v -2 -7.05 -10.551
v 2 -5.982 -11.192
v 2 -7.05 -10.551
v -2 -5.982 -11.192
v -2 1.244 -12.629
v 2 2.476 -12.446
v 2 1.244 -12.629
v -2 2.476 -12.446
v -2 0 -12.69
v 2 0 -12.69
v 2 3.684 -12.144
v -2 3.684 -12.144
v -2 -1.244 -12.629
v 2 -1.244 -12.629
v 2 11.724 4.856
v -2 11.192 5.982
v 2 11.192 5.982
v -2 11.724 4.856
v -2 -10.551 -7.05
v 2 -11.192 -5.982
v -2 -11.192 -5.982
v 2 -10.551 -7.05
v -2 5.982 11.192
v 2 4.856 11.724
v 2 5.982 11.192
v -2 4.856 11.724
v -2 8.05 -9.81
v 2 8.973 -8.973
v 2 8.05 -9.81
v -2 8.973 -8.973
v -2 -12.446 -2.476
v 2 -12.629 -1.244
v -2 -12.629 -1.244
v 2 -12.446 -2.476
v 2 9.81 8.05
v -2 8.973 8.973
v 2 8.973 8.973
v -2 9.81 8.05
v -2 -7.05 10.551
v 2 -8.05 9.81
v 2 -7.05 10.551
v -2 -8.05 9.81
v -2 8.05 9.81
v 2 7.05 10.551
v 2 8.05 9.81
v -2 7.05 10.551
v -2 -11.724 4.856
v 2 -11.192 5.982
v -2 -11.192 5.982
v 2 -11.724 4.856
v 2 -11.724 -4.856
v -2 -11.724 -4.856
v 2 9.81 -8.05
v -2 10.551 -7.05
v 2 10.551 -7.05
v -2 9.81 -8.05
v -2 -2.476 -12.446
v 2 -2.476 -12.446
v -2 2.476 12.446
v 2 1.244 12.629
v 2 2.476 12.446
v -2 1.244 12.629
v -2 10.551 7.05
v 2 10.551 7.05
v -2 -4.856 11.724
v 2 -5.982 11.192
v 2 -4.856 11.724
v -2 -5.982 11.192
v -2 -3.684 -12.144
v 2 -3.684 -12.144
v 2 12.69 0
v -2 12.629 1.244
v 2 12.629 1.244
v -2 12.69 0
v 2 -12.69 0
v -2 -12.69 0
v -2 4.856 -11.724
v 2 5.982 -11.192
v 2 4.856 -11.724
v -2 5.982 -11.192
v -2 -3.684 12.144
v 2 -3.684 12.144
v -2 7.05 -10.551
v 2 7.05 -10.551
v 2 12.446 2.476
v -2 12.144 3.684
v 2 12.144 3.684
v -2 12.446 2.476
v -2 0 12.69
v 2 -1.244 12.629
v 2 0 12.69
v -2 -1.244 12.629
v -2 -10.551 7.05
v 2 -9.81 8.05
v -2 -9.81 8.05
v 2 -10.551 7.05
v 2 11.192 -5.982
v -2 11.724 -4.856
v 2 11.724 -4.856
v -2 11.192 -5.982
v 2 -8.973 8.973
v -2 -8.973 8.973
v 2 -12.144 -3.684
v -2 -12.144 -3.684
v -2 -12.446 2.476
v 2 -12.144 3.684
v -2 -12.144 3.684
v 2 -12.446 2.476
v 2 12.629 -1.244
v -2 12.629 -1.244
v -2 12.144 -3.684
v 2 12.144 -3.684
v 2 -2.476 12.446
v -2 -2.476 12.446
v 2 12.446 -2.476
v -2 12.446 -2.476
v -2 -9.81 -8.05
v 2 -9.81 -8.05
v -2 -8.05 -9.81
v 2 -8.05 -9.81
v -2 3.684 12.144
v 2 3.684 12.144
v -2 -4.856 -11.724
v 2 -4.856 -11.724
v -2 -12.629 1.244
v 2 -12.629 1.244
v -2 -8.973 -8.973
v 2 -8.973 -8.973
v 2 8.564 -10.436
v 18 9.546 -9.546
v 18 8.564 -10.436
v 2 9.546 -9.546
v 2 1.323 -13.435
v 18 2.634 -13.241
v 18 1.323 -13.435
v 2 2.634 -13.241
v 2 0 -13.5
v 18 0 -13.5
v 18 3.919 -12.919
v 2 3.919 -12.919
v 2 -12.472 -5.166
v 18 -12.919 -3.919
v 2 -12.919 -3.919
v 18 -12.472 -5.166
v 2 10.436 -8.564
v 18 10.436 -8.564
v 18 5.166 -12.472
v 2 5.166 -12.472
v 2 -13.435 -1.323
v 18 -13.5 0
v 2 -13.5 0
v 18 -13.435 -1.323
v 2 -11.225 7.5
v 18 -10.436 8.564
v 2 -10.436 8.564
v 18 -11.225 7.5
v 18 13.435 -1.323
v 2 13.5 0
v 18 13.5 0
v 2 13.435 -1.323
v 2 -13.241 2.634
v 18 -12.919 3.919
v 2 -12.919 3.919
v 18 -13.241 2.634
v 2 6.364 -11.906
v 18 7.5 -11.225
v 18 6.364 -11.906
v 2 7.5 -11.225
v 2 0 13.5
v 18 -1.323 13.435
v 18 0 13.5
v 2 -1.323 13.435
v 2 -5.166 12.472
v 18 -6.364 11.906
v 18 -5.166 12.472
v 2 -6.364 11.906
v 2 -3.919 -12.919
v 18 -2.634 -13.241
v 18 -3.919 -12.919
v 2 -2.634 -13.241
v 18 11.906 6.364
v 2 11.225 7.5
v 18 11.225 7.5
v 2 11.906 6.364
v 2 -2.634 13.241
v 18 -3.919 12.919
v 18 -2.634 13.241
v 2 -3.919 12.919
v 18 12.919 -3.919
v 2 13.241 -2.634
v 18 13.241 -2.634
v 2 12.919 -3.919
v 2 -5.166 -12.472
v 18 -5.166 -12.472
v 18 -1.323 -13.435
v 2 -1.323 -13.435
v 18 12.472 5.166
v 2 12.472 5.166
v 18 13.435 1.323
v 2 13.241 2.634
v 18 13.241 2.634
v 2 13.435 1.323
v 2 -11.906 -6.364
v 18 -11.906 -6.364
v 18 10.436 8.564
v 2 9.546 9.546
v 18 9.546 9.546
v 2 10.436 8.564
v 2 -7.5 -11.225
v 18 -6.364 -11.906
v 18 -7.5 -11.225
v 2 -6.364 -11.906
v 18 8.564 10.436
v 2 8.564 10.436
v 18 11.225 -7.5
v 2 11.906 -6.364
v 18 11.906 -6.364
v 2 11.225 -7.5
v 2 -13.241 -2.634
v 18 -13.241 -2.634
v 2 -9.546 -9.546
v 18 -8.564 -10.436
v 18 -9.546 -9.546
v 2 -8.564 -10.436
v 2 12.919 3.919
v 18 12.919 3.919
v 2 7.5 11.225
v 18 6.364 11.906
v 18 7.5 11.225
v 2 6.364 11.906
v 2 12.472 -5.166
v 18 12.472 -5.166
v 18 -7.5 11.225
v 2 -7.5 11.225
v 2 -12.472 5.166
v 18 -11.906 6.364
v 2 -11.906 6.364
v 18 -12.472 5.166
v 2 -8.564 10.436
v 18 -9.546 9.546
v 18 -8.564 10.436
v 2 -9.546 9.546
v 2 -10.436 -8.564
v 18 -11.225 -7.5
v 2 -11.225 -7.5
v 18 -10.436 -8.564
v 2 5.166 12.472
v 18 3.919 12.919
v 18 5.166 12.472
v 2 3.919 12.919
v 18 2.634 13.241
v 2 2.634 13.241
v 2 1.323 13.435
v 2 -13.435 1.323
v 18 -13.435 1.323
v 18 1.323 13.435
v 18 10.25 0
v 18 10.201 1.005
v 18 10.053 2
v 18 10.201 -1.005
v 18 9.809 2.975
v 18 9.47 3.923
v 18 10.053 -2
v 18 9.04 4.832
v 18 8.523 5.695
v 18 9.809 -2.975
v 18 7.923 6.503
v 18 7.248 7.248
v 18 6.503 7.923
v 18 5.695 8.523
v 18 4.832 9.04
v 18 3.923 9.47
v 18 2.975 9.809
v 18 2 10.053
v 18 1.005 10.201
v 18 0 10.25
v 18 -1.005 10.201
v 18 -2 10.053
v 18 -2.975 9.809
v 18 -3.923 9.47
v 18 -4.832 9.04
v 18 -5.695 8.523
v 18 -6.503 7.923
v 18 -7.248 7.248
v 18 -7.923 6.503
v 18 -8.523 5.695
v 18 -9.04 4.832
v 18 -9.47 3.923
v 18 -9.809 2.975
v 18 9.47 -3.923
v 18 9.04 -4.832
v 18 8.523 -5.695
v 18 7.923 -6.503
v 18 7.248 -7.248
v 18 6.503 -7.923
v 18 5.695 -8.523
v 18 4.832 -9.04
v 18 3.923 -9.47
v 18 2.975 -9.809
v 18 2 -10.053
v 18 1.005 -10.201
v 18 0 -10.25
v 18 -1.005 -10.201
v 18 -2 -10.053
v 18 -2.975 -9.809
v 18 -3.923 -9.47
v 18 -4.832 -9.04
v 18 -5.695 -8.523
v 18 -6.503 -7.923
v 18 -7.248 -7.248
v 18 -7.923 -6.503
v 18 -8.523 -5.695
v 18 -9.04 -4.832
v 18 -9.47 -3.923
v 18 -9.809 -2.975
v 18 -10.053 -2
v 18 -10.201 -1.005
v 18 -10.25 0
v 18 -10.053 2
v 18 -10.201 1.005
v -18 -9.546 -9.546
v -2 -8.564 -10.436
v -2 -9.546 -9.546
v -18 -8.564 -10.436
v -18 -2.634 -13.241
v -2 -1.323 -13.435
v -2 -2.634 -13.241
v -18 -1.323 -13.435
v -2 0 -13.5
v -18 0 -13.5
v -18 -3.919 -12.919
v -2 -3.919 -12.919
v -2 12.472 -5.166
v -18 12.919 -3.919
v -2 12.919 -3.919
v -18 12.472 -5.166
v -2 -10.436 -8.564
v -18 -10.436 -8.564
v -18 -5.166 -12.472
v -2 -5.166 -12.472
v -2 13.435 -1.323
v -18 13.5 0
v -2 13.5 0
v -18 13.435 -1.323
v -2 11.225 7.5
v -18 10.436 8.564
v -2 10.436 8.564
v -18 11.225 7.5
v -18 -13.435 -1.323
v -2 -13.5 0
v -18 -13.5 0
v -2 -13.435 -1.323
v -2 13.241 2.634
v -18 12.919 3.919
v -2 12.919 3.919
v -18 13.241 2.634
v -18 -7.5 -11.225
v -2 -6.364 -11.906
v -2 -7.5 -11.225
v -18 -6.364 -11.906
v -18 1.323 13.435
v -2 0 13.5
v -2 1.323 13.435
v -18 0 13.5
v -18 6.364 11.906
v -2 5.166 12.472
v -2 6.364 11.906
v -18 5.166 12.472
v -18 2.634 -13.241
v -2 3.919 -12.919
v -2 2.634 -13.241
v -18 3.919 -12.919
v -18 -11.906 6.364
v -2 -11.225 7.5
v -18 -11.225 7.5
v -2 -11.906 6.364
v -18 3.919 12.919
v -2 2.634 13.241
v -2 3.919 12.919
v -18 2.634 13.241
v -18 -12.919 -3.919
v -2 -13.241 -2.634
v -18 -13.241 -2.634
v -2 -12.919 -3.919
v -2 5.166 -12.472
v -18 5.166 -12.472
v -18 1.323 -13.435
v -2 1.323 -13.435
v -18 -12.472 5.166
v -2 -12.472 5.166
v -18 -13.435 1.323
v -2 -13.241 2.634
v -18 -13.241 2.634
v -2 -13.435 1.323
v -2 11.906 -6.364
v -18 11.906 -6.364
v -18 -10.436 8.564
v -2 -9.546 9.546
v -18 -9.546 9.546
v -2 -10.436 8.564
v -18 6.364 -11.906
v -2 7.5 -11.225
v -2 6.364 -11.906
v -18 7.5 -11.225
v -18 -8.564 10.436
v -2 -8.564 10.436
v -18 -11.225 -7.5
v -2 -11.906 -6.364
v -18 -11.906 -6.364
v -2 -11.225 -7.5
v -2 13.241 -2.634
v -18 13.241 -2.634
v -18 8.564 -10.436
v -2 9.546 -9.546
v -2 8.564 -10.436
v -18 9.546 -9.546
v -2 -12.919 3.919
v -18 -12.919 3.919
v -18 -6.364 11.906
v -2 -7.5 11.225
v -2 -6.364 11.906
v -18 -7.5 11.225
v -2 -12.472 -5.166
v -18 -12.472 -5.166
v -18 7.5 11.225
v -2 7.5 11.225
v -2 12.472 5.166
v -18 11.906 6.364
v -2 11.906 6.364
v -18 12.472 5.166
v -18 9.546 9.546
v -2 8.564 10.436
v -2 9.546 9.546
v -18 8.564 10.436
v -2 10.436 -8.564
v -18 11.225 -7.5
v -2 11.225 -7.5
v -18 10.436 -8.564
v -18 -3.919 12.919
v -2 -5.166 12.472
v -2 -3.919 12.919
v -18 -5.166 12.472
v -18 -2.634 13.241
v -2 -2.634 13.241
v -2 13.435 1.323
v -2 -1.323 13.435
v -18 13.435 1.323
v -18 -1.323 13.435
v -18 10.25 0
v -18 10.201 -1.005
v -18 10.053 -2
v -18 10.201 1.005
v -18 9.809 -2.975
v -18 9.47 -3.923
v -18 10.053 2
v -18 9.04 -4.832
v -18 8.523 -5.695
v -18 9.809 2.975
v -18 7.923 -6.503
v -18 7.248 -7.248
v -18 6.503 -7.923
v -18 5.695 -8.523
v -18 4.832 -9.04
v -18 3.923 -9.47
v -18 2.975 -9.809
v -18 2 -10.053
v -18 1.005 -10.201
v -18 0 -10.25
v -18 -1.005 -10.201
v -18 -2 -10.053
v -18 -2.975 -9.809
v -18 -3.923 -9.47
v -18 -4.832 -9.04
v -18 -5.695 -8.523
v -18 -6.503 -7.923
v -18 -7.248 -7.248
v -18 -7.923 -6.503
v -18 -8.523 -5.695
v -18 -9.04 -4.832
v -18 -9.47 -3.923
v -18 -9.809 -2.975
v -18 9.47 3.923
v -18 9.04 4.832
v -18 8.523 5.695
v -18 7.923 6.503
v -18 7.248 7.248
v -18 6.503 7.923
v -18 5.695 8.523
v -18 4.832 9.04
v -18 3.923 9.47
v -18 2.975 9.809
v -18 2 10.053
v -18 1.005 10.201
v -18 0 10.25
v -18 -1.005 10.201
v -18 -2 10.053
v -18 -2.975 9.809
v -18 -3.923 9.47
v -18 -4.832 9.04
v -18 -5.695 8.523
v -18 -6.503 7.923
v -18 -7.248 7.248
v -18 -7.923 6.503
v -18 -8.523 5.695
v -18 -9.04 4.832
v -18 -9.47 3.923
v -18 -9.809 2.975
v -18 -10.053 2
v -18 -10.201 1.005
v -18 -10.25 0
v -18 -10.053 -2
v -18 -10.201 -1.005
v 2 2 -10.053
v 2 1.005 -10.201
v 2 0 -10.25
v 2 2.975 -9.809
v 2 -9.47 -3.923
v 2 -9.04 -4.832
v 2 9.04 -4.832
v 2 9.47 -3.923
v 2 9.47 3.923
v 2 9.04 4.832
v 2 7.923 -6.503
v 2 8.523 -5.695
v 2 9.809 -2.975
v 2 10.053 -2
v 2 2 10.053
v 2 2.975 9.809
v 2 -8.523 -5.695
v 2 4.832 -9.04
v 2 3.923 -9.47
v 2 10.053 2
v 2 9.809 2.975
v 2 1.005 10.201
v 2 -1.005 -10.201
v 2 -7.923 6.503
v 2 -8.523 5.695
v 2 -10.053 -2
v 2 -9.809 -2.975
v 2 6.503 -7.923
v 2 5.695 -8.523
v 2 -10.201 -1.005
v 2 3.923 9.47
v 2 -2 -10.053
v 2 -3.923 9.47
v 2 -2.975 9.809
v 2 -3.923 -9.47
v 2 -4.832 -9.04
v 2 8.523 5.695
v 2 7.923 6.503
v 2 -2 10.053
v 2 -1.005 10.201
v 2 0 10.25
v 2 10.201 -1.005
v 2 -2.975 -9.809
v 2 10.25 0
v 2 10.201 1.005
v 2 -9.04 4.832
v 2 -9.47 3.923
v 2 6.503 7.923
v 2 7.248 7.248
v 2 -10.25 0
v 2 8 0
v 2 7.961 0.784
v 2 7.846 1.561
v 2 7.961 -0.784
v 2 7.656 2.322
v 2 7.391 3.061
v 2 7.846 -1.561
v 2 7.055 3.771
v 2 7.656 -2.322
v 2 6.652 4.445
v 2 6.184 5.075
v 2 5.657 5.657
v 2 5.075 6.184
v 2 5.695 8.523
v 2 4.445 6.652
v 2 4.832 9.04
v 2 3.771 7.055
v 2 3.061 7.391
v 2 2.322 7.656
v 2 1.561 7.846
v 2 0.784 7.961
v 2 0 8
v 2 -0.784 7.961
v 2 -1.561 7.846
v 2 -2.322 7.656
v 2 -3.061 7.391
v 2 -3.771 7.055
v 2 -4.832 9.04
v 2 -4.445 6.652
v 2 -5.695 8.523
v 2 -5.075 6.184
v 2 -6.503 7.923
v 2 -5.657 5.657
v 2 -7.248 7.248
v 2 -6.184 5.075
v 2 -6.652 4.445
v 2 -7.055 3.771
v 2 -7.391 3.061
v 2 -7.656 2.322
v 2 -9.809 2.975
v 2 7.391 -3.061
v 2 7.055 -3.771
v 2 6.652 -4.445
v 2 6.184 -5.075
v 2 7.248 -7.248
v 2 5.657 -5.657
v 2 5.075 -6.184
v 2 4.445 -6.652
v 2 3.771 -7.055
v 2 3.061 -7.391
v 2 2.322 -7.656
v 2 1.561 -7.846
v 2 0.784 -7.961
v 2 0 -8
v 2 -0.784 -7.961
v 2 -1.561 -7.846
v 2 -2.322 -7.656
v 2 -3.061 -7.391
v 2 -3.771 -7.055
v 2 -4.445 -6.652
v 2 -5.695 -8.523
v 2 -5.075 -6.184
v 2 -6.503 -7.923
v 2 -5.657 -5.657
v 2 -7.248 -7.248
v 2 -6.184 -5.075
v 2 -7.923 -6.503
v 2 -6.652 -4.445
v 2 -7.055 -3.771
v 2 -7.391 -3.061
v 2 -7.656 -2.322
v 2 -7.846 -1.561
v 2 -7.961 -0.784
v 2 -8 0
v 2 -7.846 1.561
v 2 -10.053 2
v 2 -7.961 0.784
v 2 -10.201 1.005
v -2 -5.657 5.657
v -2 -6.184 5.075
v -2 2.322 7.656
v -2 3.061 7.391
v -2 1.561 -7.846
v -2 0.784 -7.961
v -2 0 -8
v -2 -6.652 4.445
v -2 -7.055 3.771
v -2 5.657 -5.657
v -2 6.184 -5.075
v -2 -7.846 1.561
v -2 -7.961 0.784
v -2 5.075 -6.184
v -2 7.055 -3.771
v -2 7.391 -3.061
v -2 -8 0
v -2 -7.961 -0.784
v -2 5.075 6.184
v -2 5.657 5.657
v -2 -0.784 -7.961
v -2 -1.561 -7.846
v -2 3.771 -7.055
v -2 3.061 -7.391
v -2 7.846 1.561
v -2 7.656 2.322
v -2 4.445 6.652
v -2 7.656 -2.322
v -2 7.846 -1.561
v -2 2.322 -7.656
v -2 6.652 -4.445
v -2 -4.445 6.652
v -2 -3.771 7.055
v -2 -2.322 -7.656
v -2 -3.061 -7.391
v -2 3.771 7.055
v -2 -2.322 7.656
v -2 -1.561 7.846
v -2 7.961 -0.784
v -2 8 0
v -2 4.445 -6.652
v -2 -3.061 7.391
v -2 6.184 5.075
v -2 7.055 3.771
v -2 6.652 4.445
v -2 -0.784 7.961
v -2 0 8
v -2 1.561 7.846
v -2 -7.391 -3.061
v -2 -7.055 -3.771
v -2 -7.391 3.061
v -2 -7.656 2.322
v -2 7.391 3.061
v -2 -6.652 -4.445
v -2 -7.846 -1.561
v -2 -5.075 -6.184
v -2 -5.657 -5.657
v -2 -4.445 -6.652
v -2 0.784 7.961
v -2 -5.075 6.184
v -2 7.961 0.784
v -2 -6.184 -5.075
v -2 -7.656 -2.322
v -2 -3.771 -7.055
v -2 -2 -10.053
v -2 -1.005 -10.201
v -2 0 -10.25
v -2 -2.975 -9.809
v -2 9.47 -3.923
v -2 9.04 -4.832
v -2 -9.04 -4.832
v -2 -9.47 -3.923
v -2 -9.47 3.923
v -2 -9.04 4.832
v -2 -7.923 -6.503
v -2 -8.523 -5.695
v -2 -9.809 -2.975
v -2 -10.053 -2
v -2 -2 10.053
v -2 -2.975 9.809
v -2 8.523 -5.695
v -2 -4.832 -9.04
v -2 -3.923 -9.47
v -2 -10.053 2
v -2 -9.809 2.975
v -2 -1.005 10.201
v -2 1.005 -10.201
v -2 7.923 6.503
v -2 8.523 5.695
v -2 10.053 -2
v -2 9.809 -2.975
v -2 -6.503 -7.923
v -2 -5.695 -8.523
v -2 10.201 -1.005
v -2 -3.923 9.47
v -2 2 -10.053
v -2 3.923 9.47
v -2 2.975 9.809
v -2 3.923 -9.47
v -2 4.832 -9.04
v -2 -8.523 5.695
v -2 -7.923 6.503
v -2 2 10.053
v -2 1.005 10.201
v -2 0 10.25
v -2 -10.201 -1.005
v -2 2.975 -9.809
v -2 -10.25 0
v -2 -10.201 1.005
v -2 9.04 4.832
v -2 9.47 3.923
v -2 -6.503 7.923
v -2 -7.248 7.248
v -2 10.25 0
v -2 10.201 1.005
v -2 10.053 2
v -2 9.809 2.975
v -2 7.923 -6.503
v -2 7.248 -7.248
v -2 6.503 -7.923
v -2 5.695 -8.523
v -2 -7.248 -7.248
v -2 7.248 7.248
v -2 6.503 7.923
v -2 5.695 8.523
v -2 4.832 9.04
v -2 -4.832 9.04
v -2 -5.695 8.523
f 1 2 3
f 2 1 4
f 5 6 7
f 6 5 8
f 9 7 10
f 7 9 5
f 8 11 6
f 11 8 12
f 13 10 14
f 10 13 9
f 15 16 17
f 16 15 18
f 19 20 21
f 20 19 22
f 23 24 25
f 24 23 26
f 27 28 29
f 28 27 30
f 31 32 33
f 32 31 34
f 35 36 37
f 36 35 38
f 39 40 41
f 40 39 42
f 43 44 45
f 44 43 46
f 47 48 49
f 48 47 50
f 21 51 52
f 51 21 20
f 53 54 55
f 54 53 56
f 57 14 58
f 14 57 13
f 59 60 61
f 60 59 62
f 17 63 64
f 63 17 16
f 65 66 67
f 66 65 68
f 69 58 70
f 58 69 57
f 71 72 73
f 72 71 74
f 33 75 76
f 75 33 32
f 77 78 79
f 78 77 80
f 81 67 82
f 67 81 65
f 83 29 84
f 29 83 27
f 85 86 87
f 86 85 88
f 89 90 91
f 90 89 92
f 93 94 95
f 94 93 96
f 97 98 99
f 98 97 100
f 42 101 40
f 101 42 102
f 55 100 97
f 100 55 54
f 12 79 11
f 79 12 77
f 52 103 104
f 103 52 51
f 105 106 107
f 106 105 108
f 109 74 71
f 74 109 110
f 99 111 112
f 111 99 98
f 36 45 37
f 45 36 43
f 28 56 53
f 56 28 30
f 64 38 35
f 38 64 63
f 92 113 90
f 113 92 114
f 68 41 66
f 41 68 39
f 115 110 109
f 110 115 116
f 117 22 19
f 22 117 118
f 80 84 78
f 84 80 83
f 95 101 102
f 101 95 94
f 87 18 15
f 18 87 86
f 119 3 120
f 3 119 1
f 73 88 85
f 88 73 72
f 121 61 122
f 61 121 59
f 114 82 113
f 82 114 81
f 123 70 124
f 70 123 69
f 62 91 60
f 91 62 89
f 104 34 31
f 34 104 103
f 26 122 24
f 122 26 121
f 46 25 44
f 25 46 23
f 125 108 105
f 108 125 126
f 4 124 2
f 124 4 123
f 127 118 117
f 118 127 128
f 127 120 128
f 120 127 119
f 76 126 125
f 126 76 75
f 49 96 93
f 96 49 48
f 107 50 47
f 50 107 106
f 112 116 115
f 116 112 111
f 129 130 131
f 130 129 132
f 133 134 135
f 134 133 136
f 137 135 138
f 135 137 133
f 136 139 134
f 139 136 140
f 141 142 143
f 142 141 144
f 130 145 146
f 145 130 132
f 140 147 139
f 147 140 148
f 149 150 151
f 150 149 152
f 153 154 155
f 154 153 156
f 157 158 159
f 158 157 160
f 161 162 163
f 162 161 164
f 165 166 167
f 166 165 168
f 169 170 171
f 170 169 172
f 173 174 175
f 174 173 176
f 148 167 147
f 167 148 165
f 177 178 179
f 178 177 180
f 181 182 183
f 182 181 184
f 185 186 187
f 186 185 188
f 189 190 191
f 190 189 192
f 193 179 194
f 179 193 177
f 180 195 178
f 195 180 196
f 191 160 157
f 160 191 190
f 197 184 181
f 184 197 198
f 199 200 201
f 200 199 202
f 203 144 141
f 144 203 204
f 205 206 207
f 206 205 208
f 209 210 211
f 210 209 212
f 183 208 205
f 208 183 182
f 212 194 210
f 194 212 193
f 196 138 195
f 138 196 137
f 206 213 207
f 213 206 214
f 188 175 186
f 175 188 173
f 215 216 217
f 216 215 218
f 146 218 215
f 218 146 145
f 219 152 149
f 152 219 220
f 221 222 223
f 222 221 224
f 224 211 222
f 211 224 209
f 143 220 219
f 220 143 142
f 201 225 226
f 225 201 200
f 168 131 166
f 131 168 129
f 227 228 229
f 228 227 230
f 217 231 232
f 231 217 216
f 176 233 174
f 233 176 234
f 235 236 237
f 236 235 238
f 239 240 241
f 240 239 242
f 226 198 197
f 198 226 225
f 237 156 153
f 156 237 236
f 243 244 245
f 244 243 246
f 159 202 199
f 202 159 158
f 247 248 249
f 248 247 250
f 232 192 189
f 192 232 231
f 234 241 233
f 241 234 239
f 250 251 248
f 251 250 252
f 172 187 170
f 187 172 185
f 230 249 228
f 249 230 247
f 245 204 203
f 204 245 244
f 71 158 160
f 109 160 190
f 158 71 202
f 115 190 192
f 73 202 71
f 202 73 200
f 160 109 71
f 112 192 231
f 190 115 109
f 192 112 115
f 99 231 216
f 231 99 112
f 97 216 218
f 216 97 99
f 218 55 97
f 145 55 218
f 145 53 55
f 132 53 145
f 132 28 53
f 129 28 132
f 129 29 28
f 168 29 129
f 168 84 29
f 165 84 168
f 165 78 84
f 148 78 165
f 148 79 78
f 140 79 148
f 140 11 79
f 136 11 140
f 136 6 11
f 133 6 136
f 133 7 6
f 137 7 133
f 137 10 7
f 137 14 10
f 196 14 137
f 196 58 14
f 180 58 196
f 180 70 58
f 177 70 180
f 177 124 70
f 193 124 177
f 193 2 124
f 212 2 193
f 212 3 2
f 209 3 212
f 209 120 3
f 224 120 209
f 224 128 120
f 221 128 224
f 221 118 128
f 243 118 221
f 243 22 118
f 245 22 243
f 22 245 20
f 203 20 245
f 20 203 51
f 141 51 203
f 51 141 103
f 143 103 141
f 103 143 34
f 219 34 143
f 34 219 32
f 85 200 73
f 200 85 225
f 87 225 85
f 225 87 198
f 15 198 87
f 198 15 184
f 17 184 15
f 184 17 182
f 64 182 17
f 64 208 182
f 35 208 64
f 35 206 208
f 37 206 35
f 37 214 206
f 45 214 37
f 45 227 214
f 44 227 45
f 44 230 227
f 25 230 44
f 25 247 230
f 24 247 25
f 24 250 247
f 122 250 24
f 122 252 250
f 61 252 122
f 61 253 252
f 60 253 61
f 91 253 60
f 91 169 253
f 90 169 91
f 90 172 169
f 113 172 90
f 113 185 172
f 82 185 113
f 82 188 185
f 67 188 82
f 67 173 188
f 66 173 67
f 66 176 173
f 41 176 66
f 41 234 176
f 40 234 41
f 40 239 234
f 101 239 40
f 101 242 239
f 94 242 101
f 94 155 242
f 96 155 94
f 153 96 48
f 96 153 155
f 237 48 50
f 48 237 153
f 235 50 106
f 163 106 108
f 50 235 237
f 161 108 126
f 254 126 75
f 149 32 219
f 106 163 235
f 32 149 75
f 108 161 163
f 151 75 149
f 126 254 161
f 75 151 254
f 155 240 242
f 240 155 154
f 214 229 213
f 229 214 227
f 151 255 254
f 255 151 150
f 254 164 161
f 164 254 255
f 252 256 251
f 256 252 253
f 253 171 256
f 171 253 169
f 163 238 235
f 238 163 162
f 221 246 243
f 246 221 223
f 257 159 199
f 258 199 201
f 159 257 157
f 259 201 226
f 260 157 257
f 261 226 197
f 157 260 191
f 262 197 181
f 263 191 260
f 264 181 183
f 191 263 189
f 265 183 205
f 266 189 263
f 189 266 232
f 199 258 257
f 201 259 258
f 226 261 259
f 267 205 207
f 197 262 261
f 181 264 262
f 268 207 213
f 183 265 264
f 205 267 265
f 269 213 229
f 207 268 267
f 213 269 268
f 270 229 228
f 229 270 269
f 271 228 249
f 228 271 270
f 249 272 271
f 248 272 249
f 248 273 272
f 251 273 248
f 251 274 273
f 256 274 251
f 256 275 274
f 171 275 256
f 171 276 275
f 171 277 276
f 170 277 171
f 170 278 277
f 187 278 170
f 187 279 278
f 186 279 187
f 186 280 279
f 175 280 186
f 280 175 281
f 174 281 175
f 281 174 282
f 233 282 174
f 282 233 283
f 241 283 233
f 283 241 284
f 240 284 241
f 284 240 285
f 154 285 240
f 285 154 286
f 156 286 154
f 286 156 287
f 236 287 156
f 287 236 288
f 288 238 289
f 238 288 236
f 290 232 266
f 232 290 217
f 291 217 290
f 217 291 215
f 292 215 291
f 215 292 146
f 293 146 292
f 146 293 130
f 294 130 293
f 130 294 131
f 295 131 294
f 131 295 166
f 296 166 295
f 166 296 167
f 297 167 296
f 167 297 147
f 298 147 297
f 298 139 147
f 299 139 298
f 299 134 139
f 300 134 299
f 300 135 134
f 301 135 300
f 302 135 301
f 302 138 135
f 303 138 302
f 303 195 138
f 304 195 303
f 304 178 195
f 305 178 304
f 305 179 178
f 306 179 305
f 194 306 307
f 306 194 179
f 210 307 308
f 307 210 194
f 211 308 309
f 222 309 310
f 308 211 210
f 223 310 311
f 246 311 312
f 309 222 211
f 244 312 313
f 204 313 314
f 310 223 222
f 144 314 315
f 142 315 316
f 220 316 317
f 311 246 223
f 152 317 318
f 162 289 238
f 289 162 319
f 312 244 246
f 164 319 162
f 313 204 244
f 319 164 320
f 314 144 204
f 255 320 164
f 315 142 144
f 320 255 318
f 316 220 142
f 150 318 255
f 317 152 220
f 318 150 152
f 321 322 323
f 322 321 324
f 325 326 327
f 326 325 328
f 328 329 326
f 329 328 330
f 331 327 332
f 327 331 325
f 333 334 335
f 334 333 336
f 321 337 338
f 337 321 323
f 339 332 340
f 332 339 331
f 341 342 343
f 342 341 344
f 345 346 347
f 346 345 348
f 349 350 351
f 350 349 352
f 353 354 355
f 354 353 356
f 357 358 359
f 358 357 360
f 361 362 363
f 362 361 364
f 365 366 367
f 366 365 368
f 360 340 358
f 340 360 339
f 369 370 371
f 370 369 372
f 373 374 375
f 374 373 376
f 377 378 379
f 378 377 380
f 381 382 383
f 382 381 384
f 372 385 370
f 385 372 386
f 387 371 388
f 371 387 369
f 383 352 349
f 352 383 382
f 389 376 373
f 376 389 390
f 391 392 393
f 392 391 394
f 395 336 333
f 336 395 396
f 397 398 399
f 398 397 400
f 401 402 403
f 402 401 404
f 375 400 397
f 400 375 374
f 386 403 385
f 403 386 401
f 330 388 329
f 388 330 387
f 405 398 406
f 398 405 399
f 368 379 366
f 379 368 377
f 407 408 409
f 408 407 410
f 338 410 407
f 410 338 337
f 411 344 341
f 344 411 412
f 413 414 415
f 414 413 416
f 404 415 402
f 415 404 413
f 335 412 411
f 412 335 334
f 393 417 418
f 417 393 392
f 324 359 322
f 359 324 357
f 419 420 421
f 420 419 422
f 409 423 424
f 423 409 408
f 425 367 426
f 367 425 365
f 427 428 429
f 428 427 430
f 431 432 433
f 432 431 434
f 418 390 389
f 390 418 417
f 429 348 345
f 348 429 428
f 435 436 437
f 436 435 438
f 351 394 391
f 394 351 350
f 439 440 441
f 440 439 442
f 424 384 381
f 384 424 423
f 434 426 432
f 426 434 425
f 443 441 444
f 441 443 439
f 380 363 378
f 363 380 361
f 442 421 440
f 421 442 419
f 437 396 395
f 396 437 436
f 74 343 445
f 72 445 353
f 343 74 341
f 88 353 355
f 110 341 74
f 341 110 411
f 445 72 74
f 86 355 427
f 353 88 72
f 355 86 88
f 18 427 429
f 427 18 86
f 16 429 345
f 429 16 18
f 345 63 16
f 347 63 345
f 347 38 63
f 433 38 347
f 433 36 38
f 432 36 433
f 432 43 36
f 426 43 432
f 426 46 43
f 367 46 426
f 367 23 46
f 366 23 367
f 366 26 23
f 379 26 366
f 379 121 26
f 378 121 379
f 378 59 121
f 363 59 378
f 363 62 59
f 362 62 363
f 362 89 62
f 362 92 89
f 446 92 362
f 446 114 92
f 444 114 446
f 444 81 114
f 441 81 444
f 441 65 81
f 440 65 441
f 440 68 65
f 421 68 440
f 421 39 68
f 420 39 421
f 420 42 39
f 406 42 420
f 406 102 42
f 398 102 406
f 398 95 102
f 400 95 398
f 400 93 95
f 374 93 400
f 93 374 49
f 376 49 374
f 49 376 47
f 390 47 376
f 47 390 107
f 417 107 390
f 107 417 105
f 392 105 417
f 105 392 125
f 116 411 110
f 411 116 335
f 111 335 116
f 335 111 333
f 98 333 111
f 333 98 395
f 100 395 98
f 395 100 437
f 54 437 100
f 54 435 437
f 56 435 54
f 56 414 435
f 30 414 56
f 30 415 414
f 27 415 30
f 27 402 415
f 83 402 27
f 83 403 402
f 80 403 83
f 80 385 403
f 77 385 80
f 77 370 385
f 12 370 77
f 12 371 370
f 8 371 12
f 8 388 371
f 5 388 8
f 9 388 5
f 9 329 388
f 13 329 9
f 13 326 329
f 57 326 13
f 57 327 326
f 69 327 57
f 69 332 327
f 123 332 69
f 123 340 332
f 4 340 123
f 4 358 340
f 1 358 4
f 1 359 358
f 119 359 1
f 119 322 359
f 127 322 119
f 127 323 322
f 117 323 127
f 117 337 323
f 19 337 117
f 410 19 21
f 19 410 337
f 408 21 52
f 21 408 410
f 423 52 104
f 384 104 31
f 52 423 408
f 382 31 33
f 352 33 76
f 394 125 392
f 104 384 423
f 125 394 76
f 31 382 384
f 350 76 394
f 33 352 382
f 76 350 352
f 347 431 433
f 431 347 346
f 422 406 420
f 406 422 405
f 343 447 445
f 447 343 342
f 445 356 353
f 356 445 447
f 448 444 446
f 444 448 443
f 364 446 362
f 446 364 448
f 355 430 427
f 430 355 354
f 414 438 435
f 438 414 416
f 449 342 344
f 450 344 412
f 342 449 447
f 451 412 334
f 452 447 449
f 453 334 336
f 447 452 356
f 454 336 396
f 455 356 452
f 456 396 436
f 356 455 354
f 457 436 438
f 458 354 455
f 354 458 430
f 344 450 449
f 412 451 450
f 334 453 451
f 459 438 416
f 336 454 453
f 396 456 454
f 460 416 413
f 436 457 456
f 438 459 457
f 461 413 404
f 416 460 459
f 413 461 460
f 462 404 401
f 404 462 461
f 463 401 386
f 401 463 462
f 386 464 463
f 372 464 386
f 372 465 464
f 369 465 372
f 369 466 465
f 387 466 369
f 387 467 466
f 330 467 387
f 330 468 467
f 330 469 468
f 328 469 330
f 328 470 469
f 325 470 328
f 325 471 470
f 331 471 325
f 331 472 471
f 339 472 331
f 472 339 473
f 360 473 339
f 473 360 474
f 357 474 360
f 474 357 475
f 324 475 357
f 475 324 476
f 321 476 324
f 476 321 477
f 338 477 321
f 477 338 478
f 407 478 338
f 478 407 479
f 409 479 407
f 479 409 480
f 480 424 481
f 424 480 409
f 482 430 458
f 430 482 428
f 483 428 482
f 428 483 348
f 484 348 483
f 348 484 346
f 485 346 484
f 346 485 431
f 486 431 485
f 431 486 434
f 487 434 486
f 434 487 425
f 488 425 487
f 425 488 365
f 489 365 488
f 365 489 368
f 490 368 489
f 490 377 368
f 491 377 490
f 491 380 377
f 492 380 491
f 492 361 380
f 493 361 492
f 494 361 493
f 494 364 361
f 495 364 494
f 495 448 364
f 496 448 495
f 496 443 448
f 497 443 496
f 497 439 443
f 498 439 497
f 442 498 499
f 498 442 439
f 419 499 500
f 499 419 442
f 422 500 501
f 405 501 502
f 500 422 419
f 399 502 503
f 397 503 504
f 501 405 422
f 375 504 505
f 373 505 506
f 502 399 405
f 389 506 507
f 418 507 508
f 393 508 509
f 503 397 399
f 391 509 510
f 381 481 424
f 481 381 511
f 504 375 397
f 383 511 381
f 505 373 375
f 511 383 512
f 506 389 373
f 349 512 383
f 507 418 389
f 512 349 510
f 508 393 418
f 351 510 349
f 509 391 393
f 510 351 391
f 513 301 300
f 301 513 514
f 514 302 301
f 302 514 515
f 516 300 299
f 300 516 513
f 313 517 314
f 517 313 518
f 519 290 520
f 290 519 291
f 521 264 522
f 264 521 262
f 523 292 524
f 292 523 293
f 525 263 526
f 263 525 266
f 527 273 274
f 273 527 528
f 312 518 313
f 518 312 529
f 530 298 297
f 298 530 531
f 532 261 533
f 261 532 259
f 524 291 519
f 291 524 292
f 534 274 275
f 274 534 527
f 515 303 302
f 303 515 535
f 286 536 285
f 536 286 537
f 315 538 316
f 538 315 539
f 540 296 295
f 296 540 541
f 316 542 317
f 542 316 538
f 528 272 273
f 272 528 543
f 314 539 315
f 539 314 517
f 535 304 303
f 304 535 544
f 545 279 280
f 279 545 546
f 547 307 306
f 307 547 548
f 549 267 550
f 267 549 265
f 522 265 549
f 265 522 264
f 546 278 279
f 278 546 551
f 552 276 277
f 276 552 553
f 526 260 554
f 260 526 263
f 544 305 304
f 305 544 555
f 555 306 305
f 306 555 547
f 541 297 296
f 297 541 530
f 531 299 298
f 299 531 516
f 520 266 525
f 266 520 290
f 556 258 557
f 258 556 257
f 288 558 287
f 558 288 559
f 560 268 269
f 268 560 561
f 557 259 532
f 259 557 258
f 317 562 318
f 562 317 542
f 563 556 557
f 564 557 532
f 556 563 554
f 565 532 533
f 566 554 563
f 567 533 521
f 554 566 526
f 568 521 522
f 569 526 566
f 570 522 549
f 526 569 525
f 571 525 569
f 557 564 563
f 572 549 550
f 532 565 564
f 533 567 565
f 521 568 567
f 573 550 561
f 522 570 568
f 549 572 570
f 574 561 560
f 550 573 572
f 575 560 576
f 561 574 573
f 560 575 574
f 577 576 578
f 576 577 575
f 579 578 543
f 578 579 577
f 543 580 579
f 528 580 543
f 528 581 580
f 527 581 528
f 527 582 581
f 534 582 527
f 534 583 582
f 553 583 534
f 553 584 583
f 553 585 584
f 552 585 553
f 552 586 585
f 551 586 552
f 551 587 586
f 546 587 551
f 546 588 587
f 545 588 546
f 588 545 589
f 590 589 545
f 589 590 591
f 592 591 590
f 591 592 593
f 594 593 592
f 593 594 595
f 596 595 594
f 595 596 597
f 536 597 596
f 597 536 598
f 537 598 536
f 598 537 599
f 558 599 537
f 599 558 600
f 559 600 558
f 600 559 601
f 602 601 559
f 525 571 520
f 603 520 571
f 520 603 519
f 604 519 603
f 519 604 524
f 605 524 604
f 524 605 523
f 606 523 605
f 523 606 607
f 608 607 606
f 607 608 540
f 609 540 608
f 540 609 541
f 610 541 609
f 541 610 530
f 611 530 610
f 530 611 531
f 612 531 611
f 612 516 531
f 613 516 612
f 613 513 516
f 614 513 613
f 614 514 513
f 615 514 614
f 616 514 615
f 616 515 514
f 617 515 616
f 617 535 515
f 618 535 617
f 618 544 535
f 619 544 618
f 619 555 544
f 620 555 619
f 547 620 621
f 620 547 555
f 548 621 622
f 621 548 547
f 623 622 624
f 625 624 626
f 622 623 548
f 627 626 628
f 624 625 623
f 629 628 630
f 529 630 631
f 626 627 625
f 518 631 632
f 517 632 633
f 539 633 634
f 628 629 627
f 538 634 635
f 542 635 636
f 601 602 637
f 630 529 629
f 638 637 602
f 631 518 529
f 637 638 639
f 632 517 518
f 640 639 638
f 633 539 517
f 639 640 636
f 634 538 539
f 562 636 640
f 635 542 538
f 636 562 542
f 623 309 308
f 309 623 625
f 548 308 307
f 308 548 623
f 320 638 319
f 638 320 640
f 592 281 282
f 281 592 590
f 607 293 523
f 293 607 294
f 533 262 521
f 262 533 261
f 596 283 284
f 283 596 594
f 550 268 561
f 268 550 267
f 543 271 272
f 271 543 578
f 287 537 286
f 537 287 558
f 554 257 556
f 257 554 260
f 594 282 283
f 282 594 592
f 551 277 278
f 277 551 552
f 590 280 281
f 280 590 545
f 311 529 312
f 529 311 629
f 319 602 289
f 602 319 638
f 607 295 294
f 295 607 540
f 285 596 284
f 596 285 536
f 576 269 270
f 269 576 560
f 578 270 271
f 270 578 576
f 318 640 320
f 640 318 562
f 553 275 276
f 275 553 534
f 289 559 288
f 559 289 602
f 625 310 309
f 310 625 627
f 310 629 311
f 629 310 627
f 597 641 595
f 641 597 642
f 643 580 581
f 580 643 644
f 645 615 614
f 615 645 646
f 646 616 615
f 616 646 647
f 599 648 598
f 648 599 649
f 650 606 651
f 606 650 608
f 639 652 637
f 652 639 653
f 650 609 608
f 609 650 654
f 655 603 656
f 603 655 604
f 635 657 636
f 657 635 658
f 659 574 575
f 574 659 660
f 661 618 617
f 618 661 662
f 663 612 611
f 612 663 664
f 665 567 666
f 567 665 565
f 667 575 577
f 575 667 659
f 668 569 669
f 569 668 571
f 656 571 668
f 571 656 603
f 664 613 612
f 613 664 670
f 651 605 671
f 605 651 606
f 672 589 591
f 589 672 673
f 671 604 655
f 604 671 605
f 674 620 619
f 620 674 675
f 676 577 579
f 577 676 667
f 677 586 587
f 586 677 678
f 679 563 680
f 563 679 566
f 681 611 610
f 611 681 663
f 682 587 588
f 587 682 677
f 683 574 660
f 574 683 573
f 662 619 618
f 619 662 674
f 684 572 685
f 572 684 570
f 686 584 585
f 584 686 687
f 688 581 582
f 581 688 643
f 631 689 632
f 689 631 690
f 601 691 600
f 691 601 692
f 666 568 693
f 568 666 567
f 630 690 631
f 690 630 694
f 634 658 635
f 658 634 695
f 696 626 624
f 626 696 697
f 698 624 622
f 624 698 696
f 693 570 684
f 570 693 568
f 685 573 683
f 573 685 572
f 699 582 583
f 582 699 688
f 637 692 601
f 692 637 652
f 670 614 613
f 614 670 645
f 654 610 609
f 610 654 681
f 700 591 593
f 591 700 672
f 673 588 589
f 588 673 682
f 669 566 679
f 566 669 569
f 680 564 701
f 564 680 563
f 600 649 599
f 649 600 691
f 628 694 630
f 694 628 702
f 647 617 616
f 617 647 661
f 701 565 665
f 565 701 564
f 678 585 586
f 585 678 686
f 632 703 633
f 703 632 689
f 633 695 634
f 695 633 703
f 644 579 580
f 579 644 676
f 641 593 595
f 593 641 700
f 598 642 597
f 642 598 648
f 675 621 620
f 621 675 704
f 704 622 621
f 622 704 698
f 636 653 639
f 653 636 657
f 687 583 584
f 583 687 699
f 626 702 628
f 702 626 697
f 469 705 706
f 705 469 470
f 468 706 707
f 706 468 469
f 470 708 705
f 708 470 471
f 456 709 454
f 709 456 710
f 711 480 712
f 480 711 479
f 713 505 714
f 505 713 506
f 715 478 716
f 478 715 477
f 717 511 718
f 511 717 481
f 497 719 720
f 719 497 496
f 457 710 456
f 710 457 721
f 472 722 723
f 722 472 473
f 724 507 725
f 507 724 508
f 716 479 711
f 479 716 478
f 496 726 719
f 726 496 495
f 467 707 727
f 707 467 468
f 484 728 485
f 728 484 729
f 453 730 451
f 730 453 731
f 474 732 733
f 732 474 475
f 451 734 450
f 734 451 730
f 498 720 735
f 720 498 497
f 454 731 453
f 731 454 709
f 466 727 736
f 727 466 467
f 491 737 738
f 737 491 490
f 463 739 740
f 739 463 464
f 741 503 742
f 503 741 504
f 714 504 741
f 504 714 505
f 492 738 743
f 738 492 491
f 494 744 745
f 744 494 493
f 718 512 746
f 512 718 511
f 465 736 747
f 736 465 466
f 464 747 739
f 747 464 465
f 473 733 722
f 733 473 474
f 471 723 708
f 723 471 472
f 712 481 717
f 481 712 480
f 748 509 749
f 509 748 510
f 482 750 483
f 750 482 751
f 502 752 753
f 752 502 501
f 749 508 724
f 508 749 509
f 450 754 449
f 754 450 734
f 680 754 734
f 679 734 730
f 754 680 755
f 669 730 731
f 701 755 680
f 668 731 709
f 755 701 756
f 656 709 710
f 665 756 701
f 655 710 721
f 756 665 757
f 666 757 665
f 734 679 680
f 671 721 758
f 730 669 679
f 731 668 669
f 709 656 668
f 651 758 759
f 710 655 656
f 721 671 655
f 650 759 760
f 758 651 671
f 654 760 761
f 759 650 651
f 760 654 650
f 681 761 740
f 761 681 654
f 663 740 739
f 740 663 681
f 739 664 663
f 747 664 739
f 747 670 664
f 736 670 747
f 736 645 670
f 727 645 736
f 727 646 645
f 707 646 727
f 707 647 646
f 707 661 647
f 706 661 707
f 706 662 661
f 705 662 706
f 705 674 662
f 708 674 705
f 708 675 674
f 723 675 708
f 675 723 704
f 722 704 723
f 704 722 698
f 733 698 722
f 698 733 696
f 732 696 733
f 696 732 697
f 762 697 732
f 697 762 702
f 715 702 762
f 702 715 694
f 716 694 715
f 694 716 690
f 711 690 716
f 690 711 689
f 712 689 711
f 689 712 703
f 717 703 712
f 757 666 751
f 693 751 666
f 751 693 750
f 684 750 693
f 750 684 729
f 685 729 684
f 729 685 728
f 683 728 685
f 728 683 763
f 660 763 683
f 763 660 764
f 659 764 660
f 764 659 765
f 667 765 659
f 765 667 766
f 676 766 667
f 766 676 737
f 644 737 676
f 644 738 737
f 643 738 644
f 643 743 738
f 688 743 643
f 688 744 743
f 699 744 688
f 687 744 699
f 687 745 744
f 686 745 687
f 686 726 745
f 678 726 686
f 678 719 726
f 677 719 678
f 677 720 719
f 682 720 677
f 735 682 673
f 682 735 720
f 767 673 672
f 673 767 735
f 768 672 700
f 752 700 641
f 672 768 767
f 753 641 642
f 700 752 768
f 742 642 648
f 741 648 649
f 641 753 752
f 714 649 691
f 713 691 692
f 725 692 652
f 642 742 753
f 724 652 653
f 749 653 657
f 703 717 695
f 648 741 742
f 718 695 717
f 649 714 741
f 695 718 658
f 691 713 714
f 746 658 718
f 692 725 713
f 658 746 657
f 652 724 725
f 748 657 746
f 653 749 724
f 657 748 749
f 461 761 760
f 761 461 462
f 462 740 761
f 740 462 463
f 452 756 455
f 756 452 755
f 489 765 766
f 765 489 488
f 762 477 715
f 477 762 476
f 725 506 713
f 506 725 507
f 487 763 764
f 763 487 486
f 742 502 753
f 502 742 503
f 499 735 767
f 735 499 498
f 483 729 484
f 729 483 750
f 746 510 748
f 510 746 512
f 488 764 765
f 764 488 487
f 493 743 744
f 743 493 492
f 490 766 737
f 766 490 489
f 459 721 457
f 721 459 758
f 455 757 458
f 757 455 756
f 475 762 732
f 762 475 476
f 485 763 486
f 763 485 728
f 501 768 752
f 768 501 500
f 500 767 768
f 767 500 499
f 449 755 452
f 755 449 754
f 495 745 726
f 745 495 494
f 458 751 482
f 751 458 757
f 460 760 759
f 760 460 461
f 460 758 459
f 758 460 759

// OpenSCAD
// file: ../pipecad.scad
// PipeCAD · librería OpenSCAD de accesorios
// La usan todos los .scad de modelos/serie y modelos/personalizados con:  use <../pipecad.scad>
// Medidas en milímetros. Origen: punto donde se cortan los ejes de todas las bocas.
// Pieza imprimible: cuerpo + embocaduras taladradas (Ø tubo + holgura) + paso interior que une las bocas.
//
// accesorio_pipecad(bocas, variantes, variante, holgura)
//   bocas      [[nombre, [x, y, z]], …]          dirección de cada boca, hacia fuera (no hace falta que sea unitaria)
//   variantes  [[nombre, Ø exterior, [[Ø tubo, Z, embocadura, Ø paso], … una por boca]], …]
//              Z: del origen al tope (fondo) de la embocadura · embocadura: lo que entra el tubo
//   variante   nombre de la variante a generar, p. ej. "32"
//   holgura    holgura radial de las embocaduras (mm)
// La resolución la marca $fn, que se hereda de quien llama.

function pipecad_unidad(v) = v / norm(v);

// Lleva el eje Z local a la dirección v
module pipecad_orientar(v) rotate([0, acos(v.z), atan2(v.y, v.x)]) children();

// Cilindro a lo largo del eje Z local, entre dos distancias al origen
module pipecad_tramo(r, desde, hasta) translate([0, 0, desde]) cylinder(r = r, h = hasta - desde);

module accesorio_pipecad(bocas, variantes, variante, holgura = 0.25) {
  V = variantes[search([variante], variantes, 1, 0)[0]];
  assert(V != undef, str("No existe la variante ", variante));
  R = V[1] / 2;            // radio exterior
  M = V[2];                // medidas de cada boca
  N = len(bocas);
  assert(len(M) == N, str("La variante ", variante, " no tiene medidas para todas las bocas"));
  DIR = [for (b = bocas) pipecad_unidad(b[1])];
  // Hay bocas no alineadas (codos, Tes, cruces): núcleo esférico y cámara central
  RAMIFICADO = N > 1 && max([for (i = [0:N-1]) for (j = [0:N-1]) 1 - abs(DIR[i] * DIR[j])]) > 1e-6;
  PASO_MAX = max([for (m = M) m[3]]);   // Ø del paso más ancho

  difference() {
    union() {
      for (i = [0:N-1]) pipecad_orientar(DIR[i]) {
        pipecad_tramo(R * 0.94, RAMIFICADO ? 0 : -0.5, M[i][1] + 0.6);   // cuerpo de la boca
        pipecad_tramo(R, M[i][1], M[i][1] + M[i][2]);                    // embocadura
      }
      if (RAMIFICADO) sphere(r = R * 0.97);                               // núcleo
    }
    for (i = [0:N-1]) pipecad_orientar(DIR[i]) {
      pipecad_tramo(M[i][0] / 2 + holgura, M[i][1], M[i][1] + M[i][2] + 1);       // taladro de la embocadura
      if (N > 1) pipecad_tramo(M[i][3] / 2, RAMIFICADO ? 0 : -0.5, M[i][1] + 0.5); // paso interior
    }
    if (RAMIFICADO) sphere(r = PASO_MAX / 2 * 1.15);   // cámara central (algo mayor que el paso más ancho)
  }
}
// main file
// PipeCAD · Manguito (coupling)
// Código generado por el editor de accesorios de PipeCAD. Medidas en milímetros.
// Origen: punto donde se cortan los ejes de todas las bocas. Cada boca apunta hacia fuera.
// Pieza imprimible: cuerpo + embocaduras taladradas (Ø tubo + holgura) + paso interior.
// Necesita ../pipecad.scad; «Descargar .scad» del editor la incluye dentro para abrirlo suelto.

/* [Fabricación] */
// Variante a generar
variante = "20"; // [20, 32, 40]
// Holgura radial de las embocaduras (mm)
holgura = 0.25; // [0:0.05:0.6]
// Resolución de los círculos (número de lados)
$fn = 64; // [24:8:192]

/* [Hidden] */
// Bocas: [nombre, dirección hacia fuera]
BOCAS = [
  ["A", [1, 0, 0]],
  ["B", [-1, 0, 0]]
];
// Variantes: [nombre, Ø exterior, por boca: [Ø tubo, Z (origen → tope), embocadura, Ø paso]]
VARIANTES = [
  ["20", 27, [[20, 2, 16, 16], [20, 2, 16, 16]]],
  ["32", 41, [[32, 2, 22, 27], [32, 2, 22, 27]]],
  ["40", 50, [[40, 2, 26, 34], [40, 2, 26, 34]]]
];

// Geometría: librería común de PipeCAD (modelos/pipecad.scad)
use <../pipecad.scad>

accesorio_pipecad(BOCAS, VARIANTES, variante, holgura);
